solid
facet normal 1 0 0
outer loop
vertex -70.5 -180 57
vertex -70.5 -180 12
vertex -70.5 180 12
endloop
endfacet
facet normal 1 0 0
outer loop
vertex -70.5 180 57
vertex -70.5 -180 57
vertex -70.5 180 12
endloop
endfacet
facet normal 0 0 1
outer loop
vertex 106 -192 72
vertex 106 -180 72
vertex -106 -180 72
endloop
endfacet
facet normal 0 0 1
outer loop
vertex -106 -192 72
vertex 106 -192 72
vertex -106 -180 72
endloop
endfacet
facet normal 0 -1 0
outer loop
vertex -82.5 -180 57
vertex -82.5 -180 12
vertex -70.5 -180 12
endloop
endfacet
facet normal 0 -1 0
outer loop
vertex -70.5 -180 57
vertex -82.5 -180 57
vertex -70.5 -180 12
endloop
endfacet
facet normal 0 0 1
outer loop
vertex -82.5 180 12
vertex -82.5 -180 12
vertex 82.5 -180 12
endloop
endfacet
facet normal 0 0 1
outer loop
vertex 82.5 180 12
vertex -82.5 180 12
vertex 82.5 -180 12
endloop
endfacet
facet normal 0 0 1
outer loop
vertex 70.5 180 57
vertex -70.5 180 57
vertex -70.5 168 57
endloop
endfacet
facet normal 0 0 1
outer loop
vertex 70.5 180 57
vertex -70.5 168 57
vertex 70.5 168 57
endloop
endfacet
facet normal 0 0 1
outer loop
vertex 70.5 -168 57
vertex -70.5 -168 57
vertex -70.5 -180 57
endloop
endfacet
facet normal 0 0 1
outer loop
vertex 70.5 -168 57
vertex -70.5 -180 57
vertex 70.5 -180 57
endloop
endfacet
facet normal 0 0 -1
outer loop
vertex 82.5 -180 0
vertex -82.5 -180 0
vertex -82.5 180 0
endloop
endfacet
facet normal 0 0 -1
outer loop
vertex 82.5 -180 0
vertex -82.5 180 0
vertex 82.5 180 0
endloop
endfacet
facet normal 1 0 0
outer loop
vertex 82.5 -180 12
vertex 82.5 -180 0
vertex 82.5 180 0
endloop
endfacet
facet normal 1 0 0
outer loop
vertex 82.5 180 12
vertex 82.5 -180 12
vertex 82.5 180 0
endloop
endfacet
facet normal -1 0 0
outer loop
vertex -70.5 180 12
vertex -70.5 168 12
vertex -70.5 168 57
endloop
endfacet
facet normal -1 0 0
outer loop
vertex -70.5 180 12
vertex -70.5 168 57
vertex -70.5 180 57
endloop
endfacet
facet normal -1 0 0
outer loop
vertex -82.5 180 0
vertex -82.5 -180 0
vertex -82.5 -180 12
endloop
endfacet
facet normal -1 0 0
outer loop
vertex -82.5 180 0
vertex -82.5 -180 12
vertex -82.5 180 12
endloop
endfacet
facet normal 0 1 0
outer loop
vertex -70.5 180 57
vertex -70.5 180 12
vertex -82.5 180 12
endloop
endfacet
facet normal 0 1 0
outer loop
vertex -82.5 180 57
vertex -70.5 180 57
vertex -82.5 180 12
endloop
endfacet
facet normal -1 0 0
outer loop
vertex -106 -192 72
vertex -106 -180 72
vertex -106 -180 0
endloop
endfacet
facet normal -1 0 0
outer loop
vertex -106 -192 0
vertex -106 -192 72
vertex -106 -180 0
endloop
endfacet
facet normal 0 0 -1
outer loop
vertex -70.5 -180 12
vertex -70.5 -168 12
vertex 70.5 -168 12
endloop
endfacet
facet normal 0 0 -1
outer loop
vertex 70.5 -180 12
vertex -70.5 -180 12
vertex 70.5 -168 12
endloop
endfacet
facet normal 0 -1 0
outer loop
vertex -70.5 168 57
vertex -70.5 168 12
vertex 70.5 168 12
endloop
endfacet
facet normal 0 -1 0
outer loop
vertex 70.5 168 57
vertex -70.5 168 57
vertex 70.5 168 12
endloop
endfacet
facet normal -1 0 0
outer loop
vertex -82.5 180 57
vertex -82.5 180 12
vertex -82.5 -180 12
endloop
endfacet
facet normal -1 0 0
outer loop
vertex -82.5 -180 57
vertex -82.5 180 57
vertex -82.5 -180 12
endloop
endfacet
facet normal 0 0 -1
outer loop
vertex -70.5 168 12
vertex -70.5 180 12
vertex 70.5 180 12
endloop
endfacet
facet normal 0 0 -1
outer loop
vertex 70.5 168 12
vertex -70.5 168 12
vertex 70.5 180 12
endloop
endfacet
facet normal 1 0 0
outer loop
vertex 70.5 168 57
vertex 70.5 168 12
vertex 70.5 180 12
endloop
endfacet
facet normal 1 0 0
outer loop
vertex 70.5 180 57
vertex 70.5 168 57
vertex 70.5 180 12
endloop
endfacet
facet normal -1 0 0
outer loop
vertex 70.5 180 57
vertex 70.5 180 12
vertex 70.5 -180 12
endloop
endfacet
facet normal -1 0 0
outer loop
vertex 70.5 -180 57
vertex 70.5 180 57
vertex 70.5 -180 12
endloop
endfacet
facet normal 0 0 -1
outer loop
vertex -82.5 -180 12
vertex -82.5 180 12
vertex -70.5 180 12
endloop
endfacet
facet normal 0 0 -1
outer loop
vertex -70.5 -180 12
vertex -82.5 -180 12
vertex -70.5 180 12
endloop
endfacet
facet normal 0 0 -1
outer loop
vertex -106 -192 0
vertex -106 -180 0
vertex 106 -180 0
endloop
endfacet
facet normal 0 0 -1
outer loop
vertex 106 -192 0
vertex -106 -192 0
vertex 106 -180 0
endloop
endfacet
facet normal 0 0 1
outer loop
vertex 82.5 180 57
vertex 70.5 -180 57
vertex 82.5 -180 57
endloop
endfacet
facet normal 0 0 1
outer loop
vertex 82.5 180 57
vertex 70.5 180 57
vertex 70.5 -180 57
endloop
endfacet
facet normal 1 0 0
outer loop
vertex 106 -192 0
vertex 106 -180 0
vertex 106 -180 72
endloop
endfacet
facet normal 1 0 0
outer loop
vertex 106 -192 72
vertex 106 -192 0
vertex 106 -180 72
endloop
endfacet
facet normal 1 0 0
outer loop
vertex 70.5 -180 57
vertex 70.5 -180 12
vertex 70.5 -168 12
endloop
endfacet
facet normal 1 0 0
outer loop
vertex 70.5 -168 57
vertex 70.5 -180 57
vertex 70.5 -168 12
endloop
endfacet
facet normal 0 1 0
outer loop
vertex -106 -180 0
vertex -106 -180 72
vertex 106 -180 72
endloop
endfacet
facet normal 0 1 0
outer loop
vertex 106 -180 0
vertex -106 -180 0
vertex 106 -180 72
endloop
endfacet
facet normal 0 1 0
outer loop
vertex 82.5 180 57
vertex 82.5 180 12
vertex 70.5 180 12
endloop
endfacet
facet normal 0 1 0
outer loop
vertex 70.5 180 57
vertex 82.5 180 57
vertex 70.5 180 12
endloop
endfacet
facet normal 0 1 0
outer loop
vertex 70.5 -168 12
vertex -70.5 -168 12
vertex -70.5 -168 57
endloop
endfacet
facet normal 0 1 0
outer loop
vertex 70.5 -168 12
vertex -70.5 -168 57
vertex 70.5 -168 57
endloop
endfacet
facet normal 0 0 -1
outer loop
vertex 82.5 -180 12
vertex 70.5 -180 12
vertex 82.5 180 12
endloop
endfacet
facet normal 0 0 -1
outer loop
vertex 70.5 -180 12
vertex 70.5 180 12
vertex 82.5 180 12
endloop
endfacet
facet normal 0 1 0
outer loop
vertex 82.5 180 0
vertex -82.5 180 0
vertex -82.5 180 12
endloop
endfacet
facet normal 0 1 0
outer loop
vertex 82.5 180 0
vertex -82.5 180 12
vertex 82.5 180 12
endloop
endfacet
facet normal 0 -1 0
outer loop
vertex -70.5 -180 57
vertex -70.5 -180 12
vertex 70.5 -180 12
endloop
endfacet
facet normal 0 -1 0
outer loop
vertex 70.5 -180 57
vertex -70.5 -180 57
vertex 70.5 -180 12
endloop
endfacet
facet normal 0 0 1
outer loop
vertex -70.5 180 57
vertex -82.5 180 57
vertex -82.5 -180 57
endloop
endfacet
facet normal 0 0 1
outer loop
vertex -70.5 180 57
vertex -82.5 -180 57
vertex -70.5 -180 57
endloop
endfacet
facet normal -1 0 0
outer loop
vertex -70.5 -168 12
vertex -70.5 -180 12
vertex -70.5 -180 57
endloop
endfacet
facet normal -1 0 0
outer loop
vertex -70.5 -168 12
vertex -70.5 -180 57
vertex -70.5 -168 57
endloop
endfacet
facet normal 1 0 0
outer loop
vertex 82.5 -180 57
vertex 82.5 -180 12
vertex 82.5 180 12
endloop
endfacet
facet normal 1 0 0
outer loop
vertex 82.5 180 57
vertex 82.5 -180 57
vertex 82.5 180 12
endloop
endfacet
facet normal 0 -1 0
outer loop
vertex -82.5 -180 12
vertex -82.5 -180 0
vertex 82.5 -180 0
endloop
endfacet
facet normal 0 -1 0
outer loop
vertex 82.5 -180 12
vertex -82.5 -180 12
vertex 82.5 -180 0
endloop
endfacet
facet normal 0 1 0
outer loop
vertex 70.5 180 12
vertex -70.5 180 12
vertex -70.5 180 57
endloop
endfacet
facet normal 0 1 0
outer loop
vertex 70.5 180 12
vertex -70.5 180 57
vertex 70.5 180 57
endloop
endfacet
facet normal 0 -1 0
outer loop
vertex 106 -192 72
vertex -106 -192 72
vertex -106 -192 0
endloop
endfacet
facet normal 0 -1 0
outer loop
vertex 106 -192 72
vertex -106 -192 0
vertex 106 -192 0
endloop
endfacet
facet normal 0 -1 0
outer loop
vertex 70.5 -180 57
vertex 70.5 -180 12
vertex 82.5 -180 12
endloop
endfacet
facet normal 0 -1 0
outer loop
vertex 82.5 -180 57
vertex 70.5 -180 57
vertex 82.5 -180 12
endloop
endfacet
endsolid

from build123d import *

# Parameters (mm, degrees)
F0_W     = 165
F0_H     = 360
F1_DEPTH = 12
F2_W     = 141
F2_H     = 12
F3_DEPTH = 45
F4_DEPTH = 45
F5_W     = 141
F5_H     = 45
F6_DEPTH = 12


with BuildPart() as f1:
    # F0 (on Top) → F1 (new body)
    with BuildSketch(Plane.XY):
        Rectangle(F0_W, F0_H)
    extrude(amount=F1_DEPTH)


with BuildPart() as f3:
    # F2 (on face) → F3 (new body)
    with BuildSketch(Plane.XY.offset(12)):
        with Locations((0, 174)):
            Rectangle(F2_W, F2_H)
    extrude(amount=F3_DEPTH)


with BuildPart() as f3b:
    # F2 (on face) → F3, piece 2 (new body)
    with BuildSketch(Plane.XY.offset(12)):
        with Locations((0, -174)):
            Rectangle(F2_W, F2_H)
    extrude(amount=F3_DEPTH)


with BuildPart() as f4:
    # F2 (on face) → F4 (new body)
    with BuildSketch(Plane.XY.offset(12)):
        Polygon((-82.5, 180), (-82.5, -180), (-70.5, -180), (-70.5, -168), (-70.5, 168), (-70.5, 180), align=None)
    extrude(amount=F4_DEPTH)


with BuildPart() as f4b:
    # F2 (on face) → F4, piece 2 (new body)
    with BuildSketch(Plane.XY.offset(12)):
        Polygon((70.5, -168), (70.5, -180), (82.5, -180), (82.5, 180), (70.5, 180), (70.5, 168), align=None)
    extrude(amount=F4_DEPTH)


with BuildPart() as f6:
    # F5 (on face) → F6 (new body)
    with BuildSketch(Plane.XZ.offset(180)):
        Polygon((-82.5, 0), (82.5, 0), (106, 0), (106, 72), (-106, 72), (-106, 0), align=None)
        with Locations((0, 34.5)):
            Rectangle(F5_W, F5_H, mode=Mode.SUBTRACT)
        with Locations((0, 34.5)):
            Rectangle(F5_W, F5_H)
    extrude(amount=F6_DEPTH)


solid = Compound([f1.part, f3.part, f3b.part, f4.part, f4b.part, f6.part])
